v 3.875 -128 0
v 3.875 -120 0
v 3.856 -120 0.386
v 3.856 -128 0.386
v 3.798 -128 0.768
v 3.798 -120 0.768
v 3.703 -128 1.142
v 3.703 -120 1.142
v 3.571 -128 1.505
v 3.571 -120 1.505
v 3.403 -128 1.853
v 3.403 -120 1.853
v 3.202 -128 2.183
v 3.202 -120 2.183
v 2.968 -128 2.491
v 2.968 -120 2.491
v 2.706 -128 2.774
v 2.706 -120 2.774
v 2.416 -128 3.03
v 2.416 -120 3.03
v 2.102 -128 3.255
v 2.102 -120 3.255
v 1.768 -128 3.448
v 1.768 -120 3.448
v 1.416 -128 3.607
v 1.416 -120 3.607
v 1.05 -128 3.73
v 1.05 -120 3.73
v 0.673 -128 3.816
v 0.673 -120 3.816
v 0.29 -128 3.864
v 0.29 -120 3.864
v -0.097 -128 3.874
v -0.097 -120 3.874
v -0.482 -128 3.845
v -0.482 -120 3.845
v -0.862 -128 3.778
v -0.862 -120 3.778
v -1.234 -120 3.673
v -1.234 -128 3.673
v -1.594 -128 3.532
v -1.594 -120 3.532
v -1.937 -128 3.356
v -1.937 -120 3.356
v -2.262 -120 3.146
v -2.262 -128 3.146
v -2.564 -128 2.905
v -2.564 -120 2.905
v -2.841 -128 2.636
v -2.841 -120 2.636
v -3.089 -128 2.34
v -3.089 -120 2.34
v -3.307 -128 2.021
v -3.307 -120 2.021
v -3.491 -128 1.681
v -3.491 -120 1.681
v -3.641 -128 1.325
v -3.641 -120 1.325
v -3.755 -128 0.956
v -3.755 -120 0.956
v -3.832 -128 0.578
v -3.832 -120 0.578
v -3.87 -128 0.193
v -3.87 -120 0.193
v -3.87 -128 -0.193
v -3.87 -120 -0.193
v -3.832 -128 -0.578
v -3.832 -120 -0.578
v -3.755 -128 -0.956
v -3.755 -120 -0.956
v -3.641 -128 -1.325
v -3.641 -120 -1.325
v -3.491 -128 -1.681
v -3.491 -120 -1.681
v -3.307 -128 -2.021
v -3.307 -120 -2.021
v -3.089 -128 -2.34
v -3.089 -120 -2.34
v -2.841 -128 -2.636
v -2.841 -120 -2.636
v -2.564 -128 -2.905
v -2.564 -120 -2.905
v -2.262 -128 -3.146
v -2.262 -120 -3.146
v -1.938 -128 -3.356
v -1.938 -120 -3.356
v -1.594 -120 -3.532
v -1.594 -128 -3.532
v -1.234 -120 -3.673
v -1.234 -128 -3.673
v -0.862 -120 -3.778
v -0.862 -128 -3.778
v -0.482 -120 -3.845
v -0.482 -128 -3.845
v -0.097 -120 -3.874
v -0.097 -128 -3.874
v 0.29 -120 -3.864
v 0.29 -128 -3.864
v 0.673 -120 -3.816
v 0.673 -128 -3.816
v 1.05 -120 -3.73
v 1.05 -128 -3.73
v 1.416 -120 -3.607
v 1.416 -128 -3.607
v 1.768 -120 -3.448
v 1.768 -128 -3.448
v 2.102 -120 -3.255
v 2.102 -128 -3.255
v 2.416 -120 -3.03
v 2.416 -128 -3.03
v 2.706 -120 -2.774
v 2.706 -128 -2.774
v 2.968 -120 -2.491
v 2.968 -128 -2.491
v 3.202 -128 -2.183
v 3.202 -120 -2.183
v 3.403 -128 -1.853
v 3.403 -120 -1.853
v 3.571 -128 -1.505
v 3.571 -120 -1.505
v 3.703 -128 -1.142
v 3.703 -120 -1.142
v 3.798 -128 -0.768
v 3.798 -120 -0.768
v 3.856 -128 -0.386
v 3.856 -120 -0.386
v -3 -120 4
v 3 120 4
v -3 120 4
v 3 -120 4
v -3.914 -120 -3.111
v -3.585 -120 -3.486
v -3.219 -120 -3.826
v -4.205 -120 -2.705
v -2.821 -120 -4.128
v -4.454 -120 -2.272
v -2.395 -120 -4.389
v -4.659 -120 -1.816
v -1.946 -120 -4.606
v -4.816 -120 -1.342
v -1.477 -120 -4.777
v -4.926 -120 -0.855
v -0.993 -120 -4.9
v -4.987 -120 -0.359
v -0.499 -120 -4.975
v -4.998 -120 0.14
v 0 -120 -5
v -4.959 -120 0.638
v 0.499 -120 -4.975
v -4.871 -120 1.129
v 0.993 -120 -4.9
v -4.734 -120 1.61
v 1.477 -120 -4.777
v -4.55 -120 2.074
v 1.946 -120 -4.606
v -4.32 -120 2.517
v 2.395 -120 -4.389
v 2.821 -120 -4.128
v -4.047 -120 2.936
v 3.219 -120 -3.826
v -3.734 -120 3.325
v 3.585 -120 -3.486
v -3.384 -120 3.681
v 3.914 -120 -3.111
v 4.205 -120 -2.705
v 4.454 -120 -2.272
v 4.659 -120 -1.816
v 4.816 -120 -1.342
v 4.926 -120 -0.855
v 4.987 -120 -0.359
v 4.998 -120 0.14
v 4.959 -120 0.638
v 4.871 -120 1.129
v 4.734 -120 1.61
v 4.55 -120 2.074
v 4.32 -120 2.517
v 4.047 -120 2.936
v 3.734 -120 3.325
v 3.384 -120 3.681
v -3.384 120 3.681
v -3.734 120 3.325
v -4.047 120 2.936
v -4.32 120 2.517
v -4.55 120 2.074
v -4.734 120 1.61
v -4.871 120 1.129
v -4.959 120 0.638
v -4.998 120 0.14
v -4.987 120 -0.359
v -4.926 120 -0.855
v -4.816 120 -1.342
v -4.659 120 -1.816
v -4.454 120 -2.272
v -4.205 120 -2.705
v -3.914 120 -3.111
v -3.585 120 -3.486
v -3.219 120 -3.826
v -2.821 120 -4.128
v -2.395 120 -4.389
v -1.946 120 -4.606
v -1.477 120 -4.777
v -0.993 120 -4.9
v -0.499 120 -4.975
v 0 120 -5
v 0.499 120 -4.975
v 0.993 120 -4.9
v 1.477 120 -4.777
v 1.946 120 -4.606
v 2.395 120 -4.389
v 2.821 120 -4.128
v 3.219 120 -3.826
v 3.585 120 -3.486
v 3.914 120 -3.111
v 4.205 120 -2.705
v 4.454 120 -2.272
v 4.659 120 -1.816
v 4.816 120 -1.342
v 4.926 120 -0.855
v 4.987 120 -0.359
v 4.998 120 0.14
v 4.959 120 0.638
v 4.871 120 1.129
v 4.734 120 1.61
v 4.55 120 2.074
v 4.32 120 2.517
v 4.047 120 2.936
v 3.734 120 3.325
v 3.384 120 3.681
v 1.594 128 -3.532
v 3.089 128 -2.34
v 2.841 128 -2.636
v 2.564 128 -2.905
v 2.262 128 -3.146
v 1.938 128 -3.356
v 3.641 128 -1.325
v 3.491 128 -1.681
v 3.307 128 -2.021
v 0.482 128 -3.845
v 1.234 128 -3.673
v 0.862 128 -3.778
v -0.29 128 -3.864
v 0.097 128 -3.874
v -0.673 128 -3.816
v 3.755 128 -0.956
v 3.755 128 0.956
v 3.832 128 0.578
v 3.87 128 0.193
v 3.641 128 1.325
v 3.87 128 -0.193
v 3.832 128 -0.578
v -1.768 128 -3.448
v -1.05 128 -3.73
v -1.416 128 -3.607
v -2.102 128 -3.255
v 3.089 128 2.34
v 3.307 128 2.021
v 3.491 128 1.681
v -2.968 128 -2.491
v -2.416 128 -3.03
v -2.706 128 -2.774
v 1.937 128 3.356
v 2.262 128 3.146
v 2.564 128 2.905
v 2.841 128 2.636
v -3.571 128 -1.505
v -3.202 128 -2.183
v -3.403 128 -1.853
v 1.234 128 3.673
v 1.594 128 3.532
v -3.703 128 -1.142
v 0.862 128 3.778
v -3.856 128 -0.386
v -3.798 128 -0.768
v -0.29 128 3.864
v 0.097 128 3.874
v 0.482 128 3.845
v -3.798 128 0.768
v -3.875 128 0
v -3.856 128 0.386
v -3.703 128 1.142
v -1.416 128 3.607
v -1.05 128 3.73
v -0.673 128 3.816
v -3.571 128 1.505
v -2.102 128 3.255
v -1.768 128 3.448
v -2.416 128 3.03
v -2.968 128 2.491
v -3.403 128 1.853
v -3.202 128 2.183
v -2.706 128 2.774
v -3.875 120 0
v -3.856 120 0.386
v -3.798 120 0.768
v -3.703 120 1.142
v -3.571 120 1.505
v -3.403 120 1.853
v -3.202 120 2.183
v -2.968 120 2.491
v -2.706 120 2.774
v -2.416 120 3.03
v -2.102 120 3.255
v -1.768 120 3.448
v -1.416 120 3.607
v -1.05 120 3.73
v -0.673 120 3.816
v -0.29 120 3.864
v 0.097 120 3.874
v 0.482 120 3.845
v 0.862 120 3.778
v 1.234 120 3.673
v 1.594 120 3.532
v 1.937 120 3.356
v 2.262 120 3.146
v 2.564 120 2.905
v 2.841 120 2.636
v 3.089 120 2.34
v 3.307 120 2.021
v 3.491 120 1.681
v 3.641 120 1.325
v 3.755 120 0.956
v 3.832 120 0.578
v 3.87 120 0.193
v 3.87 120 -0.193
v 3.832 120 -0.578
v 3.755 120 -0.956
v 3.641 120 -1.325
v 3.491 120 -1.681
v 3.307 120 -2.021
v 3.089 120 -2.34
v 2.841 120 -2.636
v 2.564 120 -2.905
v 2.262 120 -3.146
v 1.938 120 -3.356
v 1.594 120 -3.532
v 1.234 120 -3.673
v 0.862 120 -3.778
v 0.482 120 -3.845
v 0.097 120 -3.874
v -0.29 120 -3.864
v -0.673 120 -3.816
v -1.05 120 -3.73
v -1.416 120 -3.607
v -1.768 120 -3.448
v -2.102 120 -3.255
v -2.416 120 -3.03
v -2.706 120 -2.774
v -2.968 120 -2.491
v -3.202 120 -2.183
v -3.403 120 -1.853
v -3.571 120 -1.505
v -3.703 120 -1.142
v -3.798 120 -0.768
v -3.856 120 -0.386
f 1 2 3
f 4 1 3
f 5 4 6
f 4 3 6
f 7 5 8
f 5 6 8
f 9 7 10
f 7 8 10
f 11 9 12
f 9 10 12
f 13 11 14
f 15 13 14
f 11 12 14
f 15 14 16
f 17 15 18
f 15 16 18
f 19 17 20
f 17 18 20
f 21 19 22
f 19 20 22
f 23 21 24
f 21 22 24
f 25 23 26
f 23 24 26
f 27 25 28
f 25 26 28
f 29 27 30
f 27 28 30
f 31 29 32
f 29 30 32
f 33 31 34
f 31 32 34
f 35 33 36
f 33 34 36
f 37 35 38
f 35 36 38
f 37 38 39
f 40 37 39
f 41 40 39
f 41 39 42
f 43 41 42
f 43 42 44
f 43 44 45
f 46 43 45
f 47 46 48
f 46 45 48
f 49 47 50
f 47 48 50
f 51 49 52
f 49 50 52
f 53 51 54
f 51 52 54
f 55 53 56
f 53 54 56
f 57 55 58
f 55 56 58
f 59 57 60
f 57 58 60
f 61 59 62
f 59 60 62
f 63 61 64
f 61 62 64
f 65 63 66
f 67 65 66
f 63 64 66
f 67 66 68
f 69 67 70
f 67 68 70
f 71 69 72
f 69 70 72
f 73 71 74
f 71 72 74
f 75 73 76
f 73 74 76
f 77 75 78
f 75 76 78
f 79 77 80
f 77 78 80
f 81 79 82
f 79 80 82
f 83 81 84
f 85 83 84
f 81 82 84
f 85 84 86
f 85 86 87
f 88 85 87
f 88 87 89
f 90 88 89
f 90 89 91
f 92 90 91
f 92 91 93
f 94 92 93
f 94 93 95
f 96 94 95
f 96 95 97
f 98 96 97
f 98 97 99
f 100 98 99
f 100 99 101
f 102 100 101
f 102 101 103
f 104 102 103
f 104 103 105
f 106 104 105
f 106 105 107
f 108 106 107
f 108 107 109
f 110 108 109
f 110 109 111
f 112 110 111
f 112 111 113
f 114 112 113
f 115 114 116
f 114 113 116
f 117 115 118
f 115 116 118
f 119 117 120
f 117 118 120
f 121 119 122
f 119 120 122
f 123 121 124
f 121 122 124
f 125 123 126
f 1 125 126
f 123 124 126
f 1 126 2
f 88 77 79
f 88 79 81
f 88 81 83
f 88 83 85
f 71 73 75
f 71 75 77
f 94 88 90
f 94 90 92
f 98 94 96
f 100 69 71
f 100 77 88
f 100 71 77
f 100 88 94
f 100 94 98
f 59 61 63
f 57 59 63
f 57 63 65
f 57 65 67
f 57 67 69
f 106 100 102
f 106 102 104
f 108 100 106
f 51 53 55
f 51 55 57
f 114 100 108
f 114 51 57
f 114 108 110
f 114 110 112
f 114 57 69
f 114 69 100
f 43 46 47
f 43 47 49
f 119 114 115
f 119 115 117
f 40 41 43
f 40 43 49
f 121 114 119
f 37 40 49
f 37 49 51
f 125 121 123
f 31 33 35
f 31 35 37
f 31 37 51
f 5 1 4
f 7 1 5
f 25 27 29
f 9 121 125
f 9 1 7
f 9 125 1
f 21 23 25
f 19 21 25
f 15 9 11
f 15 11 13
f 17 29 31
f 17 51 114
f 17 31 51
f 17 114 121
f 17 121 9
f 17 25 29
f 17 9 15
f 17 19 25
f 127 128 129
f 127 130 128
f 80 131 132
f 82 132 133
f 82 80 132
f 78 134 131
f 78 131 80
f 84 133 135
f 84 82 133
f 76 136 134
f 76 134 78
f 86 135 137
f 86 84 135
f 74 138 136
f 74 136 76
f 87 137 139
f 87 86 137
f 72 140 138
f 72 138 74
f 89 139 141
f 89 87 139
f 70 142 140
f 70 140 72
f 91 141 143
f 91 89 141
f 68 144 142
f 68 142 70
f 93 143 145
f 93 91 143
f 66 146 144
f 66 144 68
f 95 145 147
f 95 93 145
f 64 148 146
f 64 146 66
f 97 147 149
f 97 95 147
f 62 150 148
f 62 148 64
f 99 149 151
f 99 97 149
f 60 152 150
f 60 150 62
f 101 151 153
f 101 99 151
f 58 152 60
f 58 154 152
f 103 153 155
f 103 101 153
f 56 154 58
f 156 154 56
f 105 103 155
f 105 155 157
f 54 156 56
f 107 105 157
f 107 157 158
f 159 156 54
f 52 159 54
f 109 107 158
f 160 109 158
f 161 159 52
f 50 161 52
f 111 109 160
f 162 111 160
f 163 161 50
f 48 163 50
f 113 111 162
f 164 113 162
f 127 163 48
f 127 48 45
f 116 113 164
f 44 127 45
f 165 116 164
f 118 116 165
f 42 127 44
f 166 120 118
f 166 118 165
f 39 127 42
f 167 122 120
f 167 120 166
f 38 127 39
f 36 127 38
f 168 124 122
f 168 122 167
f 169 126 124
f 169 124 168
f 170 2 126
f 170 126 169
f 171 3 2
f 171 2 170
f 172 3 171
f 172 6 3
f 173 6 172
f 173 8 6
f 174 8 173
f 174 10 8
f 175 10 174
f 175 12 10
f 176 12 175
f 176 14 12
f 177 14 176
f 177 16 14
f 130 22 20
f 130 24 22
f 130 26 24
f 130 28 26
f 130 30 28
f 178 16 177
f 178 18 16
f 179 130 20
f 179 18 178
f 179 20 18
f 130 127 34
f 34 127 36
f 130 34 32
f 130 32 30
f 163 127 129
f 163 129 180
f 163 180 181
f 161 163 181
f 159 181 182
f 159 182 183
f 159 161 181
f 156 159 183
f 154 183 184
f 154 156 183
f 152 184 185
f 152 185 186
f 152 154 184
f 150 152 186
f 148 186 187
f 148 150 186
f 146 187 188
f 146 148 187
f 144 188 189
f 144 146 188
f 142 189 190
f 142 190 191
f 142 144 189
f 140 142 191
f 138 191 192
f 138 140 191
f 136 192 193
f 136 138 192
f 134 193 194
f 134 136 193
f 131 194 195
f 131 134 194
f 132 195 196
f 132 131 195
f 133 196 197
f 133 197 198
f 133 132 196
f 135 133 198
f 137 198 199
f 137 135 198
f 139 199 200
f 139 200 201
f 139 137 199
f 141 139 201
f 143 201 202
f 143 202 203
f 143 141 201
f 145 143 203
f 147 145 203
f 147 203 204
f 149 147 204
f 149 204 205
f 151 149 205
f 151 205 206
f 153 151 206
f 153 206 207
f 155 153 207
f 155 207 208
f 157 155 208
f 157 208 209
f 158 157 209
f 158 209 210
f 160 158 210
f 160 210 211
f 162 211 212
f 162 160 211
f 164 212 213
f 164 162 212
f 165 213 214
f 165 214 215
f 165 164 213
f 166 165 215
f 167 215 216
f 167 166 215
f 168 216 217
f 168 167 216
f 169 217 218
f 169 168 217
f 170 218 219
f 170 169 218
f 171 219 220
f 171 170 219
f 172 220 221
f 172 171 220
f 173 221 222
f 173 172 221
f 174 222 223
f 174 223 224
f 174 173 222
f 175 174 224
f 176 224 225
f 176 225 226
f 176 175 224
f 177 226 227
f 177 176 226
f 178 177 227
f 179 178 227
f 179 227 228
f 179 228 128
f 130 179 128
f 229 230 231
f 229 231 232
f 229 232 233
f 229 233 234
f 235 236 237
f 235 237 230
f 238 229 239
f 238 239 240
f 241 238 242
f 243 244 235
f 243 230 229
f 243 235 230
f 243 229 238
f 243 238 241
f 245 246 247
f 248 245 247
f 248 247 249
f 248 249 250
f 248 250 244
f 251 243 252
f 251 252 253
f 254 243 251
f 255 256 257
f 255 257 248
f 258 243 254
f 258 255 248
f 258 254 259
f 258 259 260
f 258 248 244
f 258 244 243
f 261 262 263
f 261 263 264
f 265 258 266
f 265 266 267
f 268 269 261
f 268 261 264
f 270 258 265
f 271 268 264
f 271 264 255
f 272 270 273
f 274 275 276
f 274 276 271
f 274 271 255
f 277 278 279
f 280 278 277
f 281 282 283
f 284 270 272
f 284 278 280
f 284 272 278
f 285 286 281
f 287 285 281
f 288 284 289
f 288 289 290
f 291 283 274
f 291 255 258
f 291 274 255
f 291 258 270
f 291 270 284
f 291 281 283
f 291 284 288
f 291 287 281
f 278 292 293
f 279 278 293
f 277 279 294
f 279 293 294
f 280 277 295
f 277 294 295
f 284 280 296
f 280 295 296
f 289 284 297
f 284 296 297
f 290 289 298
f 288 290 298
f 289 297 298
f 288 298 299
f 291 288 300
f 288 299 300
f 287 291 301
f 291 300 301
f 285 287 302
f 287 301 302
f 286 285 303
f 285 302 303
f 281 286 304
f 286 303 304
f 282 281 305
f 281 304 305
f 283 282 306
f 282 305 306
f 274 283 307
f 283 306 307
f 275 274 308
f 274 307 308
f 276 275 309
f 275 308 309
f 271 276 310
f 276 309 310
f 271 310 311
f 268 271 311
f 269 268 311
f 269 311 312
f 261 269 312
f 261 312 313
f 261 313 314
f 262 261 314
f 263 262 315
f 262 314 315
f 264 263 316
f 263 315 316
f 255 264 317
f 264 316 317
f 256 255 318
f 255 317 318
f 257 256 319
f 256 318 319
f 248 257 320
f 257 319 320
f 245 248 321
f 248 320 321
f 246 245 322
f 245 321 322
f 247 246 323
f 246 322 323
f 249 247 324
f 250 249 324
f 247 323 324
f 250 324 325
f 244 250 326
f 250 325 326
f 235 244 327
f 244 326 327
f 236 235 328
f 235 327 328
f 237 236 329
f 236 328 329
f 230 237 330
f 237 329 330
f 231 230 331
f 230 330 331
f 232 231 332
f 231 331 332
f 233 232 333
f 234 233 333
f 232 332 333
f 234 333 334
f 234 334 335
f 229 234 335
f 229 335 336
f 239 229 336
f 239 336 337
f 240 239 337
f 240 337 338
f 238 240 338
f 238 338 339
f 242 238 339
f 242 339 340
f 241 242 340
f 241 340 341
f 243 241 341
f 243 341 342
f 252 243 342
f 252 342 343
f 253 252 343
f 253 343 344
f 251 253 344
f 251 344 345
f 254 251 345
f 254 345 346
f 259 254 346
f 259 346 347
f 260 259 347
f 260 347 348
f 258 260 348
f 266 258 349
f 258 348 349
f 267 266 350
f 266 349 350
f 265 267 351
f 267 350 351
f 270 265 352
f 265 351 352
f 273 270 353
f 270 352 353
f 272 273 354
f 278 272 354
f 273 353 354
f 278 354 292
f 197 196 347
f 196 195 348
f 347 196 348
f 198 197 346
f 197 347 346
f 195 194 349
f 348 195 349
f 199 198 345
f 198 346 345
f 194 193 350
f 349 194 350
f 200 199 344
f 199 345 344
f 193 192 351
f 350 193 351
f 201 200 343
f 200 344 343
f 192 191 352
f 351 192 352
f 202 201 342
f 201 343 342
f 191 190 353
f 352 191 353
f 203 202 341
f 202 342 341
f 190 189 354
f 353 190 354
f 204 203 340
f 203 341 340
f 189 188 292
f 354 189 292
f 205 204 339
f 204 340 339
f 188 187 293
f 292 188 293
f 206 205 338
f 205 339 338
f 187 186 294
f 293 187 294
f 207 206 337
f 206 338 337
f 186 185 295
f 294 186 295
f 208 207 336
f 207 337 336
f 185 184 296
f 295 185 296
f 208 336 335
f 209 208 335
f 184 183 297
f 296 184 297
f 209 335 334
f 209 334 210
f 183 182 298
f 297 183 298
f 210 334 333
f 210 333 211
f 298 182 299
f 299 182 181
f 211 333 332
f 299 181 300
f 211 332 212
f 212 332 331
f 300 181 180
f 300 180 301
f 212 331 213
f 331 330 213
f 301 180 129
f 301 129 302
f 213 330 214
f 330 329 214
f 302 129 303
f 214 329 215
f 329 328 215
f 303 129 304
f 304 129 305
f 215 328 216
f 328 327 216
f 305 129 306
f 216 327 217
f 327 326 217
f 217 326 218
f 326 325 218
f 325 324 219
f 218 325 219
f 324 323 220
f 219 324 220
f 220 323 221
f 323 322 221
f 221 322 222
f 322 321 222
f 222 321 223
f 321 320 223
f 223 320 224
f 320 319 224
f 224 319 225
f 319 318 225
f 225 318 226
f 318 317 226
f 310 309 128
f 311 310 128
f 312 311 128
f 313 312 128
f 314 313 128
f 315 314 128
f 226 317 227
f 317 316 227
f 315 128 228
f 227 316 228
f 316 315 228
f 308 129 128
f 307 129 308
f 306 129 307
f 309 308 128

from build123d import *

# Parameters (mm, degrees)
F1_DEPTH = 120
F3_R     = 3.875
F4_DEPTH = 8
F2_R     = 3.875
F5_DEPTH = 8


with BuildPart() as f1:
    # F0 (on Front) → F1 (new body, symmetric)
    with BuildSketch(Plane.XZ):
        with BuildLine():
            Line((3, 4), (-3, 4))
            ThreePointArc((-3, 4), (0, -5), (3, 4))
        make_face()
    extrude(amount=F1_DEPTH, both=True)

    # F3 (on face) → F4 (join)
    with BuildSketch(Plane.XZ.offset(120)):
        Circle(F3_R)
    extrude(amount=F4_DEPTH)

    # F2 (on face) → F5 (join)
    with BuildSketch(Plane(origin=(0, 120, 0), x_dir=(-1, 0, 0), z_dir=(0, 1, 0))):
        Circle(F2_R)
    extrude(amount=F5_DEPTH)


solid = f1.part
